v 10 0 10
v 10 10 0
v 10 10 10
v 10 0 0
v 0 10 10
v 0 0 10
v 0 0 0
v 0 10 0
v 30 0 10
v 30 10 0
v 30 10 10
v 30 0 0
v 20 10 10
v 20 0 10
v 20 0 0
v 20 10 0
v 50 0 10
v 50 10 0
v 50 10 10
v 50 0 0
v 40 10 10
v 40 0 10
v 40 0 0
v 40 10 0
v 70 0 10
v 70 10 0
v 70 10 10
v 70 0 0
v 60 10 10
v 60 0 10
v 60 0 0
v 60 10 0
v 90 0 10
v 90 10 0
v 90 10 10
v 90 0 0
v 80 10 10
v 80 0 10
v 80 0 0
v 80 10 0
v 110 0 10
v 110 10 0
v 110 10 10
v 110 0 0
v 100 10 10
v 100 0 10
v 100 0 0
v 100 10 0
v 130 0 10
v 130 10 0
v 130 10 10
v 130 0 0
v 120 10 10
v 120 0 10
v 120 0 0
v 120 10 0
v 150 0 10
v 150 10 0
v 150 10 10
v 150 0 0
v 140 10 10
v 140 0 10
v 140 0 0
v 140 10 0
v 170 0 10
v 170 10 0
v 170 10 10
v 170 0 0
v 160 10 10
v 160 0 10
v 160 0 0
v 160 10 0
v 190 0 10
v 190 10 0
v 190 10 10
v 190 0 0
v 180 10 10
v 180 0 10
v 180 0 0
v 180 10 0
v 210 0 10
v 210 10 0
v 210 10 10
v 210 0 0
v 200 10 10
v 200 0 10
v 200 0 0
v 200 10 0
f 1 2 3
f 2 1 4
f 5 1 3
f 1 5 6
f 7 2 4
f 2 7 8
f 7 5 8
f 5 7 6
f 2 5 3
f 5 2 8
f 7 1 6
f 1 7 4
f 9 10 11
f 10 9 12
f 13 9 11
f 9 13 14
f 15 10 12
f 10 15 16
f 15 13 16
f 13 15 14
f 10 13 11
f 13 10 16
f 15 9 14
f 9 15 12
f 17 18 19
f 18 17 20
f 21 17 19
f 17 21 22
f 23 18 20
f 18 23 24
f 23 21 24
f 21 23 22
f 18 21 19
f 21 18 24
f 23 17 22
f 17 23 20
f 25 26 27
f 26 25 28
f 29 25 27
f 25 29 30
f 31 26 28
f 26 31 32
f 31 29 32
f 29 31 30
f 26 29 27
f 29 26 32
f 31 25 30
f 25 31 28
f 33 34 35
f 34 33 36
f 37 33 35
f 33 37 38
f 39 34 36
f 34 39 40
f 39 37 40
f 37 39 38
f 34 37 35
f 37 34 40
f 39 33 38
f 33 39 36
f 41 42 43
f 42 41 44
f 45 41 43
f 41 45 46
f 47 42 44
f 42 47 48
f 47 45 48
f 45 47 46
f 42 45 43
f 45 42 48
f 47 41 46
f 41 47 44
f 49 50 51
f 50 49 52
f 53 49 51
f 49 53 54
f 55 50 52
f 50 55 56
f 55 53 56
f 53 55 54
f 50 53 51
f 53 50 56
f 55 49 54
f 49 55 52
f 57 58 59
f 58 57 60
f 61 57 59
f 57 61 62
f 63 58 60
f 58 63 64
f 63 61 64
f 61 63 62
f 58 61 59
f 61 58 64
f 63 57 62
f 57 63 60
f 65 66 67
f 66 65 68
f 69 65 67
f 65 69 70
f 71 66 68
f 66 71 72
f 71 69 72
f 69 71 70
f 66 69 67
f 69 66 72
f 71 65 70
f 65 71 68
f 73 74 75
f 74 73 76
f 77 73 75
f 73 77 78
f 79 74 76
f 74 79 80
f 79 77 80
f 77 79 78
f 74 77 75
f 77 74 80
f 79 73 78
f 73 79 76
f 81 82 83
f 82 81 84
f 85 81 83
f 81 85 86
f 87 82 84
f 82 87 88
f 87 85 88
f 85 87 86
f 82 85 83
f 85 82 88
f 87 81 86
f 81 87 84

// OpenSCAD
module cubeLine(count,size = 10,spacing = 10) {
    for(x = [0 : size + spacing : (size + spacing) * count]) {
        translate([x,0,0]) {
            cube([size,size,size]);
        }
    }
}

cubeLine(10);
